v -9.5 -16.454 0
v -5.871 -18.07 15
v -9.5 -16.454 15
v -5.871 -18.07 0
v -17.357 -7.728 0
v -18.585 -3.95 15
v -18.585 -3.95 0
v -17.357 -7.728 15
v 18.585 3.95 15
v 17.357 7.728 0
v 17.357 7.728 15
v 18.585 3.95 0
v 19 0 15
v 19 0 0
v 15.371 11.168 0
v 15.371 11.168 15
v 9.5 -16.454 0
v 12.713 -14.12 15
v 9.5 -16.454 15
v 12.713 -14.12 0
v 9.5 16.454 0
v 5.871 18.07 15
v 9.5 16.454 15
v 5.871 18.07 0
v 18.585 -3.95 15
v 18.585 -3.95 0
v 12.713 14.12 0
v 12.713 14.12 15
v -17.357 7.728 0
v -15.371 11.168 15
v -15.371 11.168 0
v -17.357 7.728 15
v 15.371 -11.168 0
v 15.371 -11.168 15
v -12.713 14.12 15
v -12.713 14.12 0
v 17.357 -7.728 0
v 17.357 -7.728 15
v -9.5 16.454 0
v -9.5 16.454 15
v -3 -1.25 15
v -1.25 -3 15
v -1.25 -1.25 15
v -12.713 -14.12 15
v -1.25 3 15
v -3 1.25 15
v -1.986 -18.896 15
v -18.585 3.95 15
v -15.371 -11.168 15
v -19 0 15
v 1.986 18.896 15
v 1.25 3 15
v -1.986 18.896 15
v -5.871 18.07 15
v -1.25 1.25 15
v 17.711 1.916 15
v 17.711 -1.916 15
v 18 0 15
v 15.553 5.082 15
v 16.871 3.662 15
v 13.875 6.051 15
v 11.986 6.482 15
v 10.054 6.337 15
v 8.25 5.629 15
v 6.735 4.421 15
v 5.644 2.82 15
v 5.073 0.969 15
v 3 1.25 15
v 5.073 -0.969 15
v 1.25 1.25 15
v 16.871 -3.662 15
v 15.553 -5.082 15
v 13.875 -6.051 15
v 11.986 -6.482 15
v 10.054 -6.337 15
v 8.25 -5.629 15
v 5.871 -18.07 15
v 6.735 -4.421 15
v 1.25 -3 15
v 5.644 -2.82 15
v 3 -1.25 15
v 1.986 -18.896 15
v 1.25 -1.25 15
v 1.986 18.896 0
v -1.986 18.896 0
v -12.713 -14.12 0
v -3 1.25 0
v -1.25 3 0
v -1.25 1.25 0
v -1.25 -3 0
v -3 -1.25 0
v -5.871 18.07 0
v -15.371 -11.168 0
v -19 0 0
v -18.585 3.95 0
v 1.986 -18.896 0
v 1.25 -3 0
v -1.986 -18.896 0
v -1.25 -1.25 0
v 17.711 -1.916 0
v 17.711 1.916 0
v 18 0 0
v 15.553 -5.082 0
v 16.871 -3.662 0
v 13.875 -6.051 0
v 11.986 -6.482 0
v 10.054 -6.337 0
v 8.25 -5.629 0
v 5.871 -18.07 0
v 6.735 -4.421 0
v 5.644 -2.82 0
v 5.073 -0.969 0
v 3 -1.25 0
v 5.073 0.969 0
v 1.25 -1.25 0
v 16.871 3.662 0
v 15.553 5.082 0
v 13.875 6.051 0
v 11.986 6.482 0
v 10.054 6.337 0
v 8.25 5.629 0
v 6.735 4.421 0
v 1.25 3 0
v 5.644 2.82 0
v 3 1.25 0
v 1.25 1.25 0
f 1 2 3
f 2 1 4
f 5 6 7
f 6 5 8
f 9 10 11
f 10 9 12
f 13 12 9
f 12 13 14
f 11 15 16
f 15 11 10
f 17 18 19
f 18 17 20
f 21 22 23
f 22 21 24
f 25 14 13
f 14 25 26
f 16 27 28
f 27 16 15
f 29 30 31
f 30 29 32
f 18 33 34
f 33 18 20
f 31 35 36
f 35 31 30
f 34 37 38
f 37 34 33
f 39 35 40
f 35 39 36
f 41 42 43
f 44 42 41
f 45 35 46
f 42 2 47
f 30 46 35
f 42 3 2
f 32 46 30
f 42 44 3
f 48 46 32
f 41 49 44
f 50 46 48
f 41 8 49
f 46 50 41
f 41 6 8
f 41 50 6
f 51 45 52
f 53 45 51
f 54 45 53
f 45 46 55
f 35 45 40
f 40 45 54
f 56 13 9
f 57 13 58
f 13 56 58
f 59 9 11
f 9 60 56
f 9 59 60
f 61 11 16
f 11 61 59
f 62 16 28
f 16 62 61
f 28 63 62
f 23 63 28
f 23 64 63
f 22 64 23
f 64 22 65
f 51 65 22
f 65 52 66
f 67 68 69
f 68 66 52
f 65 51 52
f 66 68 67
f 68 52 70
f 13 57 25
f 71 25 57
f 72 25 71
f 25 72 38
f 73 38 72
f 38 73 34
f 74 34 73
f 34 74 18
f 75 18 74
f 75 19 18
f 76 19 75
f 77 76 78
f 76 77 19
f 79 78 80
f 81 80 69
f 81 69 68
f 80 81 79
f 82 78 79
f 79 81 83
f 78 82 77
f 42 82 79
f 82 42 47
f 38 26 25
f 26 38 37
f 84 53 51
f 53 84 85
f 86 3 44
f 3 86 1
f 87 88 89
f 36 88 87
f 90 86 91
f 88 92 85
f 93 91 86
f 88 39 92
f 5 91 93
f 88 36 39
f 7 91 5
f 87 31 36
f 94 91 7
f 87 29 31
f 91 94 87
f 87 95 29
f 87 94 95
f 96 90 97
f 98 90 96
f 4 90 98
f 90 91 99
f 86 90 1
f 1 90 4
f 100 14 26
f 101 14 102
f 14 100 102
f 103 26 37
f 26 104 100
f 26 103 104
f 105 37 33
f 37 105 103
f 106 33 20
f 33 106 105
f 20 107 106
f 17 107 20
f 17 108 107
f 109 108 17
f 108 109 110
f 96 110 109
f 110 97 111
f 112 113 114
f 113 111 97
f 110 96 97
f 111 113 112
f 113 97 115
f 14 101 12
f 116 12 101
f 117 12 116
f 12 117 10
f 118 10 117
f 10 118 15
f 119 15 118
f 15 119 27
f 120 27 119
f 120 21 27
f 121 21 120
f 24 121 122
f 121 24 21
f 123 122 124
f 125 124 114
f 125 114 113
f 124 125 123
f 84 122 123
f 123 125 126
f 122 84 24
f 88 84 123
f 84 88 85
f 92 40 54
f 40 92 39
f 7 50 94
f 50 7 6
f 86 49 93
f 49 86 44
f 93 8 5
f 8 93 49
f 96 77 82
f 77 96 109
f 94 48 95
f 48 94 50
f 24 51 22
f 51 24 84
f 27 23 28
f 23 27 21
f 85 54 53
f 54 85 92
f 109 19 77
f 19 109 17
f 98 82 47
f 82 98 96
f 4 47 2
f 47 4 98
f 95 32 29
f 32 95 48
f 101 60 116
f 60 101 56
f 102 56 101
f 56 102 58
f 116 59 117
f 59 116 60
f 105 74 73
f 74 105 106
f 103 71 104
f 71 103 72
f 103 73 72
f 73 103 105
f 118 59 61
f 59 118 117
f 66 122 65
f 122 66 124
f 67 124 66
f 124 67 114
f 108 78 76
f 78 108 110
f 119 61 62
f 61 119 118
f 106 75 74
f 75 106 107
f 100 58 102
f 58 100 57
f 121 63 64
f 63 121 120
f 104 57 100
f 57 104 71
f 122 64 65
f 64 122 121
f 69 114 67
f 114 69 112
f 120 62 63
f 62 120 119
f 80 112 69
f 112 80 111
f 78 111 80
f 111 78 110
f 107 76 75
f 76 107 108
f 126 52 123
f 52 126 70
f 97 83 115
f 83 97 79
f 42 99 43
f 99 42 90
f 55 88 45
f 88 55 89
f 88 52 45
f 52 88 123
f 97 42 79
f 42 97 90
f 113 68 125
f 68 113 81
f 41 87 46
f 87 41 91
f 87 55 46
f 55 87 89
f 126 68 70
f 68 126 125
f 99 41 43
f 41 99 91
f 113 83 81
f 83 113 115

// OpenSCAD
difference() {
	cylinder(r=19,h=15);
	translate([11.5, 0, -1]) cylinder(r=13/2,h=17);
	translate([-1.25, -3, -1]) cube([2.5, 6, 17]);
	translate([-3, -1.25, -1]) cube([6,2.5, 17]);
}
